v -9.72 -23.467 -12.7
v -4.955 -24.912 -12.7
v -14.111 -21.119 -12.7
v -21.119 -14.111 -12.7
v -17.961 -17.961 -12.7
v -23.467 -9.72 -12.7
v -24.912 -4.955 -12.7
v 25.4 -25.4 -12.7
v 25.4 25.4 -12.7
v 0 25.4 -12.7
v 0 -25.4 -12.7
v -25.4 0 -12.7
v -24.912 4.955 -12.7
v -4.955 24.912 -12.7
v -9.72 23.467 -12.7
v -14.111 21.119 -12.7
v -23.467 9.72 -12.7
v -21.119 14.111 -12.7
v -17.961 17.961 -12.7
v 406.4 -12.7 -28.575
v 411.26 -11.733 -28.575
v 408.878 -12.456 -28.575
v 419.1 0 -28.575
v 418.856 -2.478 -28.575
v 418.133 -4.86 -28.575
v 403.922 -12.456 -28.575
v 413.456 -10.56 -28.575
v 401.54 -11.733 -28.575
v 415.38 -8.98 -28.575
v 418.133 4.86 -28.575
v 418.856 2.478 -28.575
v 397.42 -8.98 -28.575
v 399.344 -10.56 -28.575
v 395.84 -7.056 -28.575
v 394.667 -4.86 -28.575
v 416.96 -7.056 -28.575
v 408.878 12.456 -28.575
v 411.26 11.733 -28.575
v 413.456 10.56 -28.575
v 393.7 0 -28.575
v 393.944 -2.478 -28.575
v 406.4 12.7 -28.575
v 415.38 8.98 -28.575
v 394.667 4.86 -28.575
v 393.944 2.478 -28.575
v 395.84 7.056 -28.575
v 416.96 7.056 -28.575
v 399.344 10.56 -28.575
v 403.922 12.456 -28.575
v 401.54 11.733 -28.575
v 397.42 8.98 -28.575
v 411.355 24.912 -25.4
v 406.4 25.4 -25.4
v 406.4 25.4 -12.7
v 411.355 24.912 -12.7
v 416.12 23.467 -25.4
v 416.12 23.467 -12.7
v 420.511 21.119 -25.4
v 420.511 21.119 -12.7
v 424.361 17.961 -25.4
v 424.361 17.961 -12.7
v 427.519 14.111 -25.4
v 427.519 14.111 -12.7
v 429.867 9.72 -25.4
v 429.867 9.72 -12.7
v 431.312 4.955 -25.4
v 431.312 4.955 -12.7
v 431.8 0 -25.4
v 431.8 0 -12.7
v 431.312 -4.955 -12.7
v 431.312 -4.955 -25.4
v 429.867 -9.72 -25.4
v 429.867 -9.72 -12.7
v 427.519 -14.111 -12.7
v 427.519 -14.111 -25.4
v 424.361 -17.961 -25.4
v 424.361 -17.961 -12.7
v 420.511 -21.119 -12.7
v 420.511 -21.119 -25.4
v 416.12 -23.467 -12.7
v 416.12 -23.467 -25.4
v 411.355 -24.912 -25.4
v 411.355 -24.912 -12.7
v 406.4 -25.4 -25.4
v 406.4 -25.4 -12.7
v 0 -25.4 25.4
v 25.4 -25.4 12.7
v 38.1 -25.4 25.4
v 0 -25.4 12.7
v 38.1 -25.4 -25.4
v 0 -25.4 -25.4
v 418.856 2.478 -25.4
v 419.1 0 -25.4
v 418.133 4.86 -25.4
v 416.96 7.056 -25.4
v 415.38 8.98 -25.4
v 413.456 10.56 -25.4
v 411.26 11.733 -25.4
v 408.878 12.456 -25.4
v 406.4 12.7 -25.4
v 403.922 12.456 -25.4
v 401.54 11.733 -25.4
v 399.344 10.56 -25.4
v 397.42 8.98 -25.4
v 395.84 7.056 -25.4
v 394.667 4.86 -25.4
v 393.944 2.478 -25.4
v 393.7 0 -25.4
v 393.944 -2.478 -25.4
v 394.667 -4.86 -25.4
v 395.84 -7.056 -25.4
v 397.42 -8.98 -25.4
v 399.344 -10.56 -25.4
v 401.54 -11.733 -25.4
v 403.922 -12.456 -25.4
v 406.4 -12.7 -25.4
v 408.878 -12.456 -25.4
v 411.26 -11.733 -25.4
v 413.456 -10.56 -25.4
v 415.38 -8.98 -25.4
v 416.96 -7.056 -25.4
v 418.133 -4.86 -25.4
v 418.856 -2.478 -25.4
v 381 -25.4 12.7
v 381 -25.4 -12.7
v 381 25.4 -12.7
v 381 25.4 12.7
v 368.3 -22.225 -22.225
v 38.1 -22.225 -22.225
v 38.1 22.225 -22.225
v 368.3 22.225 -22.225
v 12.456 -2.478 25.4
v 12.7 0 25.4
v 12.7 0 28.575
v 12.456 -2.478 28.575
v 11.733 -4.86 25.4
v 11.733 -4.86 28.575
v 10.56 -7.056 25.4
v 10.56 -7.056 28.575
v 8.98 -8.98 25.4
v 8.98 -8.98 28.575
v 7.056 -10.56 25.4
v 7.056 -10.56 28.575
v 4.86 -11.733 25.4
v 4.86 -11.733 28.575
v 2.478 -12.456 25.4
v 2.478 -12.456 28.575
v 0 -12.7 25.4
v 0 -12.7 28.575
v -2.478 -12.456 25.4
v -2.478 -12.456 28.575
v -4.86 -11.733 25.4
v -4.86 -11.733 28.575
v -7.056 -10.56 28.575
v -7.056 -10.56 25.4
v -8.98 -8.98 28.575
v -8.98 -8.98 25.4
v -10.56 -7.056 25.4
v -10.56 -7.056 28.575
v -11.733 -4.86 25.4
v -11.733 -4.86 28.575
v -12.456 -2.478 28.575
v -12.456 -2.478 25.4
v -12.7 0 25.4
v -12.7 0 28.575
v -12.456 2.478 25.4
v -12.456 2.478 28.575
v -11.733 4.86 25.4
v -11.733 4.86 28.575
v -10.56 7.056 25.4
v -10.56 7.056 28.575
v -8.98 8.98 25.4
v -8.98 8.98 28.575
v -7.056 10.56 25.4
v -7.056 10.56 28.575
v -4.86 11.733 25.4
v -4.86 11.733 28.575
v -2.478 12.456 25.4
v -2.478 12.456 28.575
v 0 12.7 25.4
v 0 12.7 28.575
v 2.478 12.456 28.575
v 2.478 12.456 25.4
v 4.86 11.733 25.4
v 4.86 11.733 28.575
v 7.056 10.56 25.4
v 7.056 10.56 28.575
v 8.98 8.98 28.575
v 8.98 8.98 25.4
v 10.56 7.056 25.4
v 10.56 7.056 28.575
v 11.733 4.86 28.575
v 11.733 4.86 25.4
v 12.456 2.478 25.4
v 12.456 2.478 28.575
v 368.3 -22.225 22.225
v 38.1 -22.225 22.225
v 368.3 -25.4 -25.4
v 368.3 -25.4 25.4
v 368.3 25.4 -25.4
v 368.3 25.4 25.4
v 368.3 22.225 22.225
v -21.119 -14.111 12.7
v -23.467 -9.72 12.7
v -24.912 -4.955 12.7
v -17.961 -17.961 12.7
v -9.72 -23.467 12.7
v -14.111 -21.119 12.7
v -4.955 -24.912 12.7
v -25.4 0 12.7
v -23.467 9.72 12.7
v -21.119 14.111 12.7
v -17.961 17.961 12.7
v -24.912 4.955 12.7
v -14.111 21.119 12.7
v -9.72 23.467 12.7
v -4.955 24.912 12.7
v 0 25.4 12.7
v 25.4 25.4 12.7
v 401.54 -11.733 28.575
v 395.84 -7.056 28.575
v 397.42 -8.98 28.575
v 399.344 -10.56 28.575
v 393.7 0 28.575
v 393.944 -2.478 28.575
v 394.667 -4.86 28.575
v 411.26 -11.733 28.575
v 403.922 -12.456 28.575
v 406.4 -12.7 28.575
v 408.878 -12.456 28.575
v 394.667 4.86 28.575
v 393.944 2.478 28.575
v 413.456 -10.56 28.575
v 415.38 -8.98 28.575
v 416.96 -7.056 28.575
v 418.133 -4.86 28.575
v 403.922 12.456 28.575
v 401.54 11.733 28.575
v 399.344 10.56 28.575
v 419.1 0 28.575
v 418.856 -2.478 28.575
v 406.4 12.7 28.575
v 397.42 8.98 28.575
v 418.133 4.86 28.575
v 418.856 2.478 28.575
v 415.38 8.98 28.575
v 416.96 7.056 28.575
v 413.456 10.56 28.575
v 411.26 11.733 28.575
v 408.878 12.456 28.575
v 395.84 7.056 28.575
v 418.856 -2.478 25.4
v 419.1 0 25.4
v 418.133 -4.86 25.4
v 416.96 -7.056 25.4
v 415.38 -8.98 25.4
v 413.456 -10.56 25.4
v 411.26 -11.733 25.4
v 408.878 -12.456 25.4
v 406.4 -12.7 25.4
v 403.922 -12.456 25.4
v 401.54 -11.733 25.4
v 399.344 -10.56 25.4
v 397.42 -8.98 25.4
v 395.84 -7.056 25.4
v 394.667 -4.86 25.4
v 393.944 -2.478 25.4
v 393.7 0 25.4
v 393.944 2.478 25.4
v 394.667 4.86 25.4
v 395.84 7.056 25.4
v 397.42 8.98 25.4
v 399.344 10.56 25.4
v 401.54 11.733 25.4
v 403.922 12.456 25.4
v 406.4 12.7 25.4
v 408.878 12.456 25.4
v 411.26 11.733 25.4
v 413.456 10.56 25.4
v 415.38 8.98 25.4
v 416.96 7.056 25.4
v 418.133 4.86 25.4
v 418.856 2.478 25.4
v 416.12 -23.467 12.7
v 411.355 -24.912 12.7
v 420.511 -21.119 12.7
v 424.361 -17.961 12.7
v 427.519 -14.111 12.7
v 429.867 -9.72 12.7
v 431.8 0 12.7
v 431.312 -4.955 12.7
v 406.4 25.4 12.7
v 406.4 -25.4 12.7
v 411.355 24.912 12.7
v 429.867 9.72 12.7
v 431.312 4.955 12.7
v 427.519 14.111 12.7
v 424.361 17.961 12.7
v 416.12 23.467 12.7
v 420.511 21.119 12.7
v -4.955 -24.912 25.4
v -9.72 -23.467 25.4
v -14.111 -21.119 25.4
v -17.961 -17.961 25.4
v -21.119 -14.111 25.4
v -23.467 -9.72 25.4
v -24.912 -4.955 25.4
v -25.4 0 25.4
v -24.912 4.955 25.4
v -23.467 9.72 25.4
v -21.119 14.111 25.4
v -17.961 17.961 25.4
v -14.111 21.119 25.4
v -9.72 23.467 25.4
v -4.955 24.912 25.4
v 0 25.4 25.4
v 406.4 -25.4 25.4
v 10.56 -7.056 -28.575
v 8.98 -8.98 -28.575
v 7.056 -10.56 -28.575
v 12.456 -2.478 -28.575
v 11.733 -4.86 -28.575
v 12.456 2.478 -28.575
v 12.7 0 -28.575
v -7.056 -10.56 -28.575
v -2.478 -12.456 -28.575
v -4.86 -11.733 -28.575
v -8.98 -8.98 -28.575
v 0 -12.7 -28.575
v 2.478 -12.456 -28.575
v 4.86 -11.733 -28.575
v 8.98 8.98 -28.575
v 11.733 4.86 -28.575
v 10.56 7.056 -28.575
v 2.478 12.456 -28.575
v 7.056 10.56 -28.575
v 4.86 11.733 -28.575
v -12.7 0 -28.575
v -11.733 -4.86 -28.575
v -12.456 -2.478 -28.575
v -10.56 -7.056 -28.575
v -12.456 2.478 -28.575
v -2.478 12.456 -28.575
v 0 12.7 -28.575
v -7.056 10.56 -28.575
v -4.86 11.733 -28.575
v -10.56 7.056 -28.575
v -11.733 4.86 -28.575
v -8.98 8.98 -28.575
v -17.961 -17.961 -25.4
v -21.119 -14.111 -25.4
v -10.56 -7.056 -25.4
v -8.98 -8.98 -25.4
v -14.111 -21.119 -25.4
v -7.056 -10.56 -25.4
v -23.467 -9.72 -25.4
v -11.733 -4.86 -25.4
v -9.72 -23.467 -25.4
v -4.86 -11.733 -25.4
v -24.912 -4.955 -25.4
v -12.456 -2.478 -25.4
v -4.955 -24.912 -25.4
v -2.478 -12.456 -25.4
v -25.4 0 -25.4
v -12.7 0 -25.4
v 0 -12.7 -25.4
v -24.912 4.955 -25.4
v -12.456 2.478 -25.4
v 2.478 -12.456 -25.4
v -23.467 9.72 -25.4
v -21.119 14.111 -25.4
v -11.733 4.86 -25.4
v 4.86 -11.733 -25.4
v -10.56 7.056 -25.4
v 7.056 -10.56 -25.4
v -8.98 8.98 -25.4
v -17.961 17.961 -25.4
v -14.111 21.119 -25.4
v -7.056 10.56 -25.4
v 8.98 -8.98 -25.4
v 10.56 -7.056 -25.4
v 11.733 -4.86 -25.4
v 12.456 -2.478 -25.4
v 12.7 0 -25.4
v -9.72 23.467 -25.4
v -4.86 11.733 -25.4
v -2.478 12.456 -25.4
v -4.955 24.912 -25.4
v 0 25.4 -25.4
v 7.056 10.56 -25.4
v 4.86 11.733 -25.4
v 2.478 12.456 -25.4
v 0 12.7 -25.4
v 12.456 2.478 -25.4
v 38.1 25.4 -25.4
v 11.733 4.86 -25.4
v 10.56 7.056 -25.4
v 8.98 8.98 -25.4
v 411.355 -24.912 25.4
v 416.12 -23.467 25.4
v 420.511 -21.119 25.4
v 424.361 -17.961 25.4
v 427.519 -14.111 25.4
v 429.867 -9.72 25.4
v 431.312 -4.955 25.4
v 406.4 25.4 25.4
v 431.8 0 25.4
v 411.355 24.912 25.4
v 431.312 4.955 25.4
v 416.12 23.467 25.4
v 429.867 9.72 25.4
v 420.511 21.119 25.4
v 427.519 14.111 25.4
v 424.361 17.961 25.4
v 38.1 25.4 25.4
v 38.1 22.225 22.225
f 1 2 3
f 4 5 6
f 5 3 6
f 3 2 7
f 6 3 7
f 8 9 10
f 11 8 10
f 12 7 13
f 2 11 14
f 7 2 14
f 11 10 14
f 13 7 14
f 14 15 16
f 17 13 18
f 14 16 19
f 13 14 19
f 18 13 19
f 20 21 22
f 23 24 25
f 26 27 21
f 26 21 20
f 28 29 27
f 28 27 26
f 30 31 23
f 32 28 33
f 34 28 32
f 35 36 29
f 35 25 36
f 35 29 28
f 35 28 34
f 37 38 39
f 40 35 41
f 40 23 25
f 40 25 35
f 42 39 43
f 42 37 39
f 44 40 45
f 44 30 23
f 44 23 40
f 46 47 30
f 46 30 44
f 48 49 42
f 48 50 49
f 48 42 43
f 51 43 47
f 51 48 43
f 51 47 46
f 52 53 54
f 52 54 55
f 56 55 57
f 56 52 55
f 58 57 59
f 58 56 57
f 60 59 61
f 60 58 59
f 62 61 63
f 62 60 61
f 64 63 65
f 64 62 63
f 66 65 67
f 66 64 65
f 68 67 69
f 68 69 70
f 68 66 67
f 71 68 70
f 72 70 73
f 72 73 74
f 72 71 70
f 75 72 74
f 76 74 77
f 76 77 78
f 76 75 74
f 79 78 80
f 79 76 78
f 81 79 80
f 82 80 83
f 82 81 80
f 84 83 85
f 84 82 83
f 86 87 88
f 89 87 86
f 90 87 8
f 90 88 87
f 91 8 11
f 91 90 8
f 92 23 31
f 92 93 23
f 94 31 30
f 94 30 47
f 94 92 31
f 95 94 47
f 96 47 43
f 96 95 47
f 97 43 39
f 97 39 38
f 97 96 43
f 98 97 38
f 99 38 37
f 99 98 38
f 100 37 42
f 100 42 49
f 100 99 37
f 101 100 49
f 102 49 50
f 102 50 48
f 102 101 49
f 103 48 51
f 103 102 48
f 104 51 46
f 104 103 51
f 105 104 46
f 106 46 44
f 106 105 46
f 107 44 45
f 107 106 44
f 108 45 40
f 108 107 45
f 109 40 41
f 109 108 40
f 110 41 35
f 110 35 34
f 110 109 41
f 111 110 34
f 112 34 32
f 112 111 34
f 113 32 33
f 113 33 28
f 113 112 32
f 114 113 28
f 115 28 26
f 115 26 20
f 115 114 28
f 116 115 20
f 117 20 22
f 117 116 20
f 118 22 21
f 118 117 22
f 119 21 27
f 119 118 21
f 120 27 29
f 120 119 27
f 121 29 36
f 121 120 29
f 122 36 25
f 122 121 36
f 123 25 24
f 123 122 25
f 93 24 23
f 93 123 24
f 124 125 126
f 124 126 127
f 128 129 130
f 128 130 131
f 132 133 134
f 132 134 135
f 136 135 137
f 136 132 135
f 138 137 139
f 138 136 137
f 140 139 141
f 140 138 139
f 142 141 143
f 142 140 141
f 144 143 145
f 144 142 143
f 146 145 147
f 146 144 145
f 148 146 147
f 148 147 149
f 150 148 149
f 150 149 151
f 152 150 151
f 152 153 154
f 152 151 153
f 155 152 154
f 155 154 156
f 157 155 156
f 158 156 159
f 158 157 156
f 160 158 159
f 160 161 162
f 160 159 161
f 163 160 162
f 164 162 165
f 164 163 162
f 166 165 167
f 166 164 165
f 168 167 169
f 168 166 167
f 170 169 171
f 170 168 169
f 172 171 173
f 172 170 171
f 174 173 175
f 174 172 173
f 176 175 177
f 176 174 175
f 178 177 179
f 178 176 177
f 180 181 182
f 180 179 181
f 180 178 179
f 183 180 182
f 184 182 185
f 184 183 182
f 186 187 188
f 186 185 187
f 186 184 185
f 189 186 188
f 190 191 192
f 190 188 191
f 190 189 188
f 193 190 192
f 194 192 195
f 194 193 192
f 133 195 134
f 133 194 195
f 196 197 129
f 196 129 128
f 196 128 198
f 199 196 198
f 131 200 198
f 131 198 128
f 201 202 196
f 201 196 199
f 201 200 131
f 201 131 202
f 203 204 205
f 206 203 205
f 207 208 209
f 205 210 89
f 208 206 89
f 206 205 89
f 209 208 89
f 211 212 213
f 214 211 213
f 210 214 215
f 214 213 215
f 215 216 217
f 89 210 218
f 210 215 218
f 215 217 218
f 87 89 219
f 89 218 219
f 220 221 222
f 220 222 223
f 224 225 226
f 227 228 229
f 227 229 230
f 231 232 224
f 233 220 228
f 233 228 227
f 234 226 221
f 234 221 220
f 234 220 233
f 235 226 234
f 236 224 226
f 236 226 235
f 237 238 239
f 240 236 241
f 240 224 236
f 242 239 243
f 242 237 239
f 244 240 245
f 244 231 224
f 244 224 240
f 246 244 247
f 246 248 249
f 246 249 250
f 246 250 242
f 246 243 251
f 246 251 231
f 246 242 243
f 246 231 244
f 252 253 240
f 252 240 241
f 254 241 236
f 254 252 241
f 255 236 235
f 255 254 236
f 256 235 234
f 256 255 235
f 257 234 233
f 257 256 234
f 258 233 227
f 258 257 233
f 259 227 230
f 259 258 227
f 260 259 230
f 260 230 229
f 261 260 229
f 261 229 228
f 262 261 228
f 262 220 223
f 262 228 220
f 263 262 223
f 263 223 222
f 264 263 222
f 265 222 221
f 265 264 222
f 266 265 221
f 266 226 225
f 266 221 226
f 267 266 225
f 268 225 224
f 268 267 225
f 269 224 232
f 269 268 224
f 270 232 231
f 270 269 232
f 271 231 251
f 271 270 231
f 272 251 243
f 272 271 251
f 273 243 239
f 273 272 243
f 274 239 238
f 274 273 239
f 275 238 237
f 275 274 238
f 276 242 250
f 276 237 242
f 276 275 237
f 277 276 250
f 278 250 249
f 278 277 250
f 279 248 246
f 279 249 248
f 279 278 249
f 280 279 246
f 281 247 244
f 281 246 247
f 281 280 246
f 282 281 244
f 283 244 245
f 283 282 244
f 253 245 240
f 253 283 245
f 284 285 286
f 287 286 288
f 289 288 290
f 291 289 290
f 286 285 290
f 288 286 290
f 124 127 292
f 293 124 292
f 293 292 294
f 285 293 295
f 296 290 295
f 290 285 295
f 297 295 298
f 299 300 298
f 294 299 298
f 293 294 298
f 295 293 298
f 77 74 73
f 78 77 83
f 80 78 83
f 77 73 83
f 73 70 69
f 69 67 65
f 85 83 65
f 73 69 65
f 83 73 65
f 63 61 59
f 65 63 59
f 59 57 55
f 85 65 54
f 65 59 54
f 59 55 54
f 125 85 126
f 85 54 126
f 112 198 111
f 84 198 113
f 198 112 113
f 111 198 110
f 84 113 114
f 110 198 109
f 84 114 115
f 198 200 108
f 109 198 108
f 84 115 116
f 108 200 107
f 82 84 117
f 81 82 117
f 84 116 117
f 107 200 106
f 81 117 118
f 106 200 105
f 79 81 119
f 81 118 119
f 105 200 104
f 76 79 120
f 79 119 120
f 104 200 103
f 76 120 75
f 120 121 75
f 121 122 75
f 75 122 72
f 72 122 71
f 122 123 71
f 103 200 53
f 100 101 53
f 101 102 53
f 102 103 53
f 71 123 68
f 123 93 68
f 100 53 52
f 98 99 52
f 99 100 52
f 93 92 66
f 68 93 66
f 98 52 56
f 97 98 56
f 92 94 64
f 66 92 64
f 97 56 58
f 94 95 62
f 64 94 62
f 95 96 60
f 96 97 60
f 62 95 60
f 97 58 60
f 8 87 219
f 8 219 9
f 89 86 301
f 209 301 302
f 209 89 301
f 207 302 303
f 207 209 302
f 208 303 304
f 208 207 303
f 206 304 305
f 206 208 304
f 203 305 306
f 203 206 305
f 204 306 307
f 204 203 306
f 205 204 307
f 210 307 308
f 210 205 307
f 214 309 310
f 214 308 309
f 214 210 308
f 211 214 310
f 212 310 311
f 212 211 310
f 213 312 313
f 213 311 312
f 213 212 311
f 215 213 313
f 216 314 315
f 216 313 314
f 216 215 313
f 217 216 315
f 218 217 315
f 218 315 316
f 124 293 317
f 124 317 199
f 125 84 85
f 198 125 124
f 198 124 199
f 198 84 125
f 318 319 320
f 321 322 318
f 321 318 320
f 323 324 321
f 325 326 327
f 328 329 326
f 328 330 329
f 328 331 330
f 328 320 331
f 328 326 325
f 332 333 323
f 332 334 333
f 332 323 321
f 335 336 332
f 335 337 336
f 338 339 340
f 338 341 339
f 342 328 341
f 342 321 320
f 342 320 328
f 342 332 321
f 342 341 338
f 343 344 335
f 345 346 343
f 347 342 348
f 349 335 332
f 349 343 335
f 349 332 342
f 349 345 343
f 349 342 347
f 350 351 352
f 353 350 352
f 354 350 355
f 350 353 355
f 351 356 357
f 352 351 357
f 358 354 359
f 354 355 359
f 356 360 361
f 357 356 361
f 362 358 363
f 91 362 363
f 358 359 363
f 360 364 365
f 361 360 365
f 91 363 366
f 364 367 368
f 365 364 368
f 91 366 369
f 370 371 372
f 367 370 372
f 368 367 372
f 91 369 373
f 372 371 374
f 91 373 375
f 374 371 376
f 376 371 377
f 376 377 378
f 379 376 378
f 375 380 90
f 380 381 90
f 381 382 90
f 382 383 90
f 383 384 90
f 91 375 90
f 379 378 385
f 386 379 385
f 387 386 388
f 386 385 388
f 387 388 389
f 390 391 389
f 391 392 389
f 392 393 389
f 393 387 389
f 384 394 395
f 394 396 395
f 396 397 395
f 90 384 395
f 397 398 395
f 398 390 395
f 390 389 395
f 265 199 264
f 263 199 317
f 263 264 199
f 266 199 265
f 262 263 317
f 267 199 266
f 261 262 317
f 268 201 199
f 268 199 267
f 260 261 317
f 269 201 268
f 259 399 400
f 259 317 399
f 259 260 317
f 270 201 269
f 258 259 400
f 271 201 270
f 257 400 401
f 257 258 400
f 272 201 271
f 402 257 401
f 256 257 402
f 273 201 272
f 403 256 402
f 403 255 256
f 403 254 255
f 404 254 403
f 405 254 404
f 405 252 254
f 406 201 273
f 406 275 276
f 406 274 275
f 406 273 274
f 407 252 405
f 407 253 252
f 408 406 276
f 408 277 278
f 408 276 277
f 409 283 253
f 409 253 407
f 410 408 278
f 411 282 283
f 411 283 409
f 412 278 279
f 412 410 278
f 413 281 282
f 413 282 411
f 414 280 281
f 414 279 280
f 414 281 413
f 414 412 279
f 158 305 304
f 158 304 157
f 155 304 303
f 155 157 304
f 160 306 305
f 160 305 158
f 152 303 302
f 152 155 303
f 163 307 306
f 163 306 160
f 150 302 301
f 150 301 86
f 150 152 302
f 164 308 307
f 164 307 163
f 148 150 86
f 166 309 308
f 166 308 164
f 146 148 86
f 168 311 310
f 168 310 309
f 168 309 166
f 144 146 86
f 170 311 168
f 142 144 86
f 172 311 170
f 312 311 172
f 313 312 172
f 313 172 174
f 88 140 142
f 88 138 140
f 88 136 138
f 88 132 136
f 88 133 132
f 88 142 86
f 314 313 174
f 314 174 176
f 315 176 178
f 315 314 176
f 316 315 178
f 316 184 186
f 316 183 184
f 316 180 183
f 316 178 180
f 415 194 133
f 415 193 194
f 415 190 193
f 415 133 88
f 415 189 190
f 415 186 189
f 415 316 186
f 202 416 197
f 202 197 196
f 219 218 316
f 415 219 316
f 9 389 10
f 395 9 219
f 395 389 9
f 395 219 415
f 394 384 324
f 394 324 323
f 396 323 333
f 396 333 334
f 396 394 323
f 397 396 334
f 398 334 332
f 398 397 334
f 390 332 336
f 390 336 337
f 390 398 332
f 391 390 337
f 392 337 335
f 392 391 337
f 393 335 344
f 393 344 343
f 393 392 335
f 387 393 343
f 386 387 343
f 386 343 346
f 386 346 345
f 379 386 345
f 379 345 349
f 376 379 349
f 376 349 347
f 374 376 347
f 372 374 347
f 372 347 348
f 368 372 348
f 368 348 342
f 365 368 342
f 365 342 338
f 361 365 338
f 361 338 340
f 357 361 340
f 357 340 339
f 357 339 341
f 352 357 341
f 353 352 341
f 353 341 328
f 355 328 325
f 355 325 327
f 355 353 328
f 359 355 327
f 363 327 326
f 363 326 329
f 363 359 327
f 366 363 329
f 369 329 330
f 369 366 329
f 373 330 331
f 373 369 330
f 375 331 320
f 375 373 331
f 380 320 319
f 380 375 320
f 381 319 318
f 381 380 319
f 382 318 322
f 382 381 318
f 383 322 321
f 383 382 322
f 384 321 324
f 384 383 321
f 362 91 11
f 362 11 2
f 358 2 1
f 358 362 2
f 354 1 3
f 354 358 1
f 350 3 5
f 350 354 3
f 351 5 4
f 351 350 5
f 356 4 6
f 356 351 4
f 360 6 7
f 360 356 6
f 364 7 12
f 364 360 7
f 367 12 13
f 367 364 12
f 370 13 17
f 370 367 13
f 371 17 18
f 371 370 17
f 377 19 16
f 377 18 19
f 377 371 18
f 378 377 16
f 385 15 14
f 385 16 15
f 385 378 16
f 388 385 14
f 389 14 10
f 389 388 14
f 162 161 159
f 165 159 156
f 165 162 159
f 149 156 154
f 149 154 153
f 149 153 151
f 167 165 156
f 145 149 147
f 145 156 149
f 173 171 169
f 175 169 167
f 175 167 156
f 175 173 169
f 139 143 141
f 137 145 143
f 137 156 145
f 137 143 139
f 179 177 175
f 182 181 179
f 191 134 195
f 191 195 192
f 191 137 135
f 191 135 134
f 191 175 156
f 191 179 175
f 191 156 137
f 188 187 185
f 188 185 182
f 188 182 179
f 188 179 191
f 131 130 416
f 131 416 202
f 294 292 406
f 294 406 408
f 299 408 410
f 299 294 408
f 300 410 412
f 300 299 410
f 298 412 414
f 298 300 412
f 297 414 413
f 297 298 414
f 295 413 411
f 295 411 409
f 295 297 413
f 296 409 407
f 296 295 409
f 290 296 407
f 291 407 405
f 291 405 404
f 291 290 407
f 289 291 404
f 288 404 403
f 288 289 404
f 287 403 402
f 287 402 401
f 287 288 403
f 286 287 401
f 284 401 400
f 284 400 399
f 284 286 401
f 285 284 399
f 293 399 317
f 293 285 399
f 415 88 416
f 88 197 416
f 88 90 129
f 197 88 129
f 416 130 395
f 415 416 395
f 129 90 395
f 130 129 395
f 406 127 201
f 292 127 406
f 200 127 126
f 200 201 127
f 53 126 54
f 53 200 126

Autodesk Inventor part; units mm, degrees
sketch "Sketch1" plane through (0, 0, 0) normal (0, 0, 1) x (1, 0, 0)
  line L0 (0, 25.4) -> (406.4, 25.4)
  line L1 (406.4, 25.4) -> (406.4, -25.4)
  line L2 (406.4, -25.4) -> (0, -25.4)
  line L3 (0, -25.4) -> (0, 25.4)
  circle A0 centre (0, 0) radius 25.4
  circle A1 centre (406.4, 0) radius 25.4
  dimension "d0" = 406.4
  dimension "d1" = 50.8
extrude "Extrusion1" add sketch "Sketch1" along normal mid plane 50.8
sketch "Sketch2" plane through (0, 25.4, 25.4) normal (0, 1, 0) x (1, 0, 0)
  line L0 (-25.4, 50.8) -> (-25.4, 0) projected
  line L1 (-25.4, 50.8) -> (0, 50.8) projected
  line L2 (0, 0) -> (-25.4, 0) projected
  line L3 (0, 0) -> (406.4, 0) projected
  line L4 (406.4, 50.8) -> (0, 50.8) projected
  line L5 (-25.4, 12.7) -> (25.4, 12.7)
  line L6 (25.4, 12.7) -> (25.4, 38.1)
  line L7 (25.4, 38.1) -> (-25.4, 38.1)
  line L8 (-25.4, 38.1) -> (-25.4, 12.7)
  point P0 (-25.4, 25.4)
  point P1 (-25.4, 25.4)
  dimension "d4" = 25.4
  dimension "d10" = 50.8
extrude "Extrusion2" cut sketch "Sketch2" against normal through all
ref_plane "Work Plane1" through (431.8, 0, 0) normal (1, 0, 0) x (0, 1, 0)
ref_plane "Work Plane2" through (-25.4, 0, 0) normal (1, 0, 0) x (0, 1, 0)
ref_plane "Work Plane3" through (203.2, 0, 0) normal (1, 0, 0) x (0, 1, 0)
sketch "Sketch5" plane through (0, 0, 25.4) normal (0, 0, 1) x (1, 0, 0)
  arc A0 (406.4, -25.4) -> (406.4, 25.4) centre (406.4, 0) ccw projected
  line L0 (0, 25.4) -> (406.4, 25.4) projected
  arc A1 (0, 25.4) -> (0, -25.4) centre (0, 0) ccw projected
  line L1 (406.4, -25.4) -> (0, -25.4) projected
  circle A2 centre (0, 0) radius 25.4 construction
  circle A3 centre (406.4, 0) radius 25.4 construction
  line L2 (38.1, 25.4) -> (38.1, -25.4)
  line L3 (368.3, 25.4) -> (368.3, -25.4)
  dimension "d11" = 12.7
  dimension "d13" = 12.7
extrude "Extrusion4" cut sketch "Sketch5" against normal blind 3.175 contours L1 L2 L0 L3
pattern_circular "Circular Pattern1" count 4 over 360 about axis through (-10, 0, 0) along (1, 0, 0) of "Extrusion4"
mirror "Mirror1" about plane through (203.2, 0, 0) normal (1, 0, 0) of "Extrusion2"
sketch "Sketch3" plane through (0, 0, 25.4) normal (0, 0, 1) x (1, 0, 0)
  arc A0 (0, 25.4) -> (0, -25.4) centre (0, 0) ccw projected
  arc A1 (406.4, -25.4) -> (406.4, 25.4) centre (406.4, 0) ccw projected
  circle A2 centre (0, 0) radius 12.7
  circle A3 centre (406.4, 0) radius 12.7
  dimension "d7" = 25.4
extrude "Extrusion3" add sketch "Sketch3" along normal blind 3.175
mirror "Mirror2" about plane through (0, 0, 0) normal (0, 0, 1) of "Extrusion3"
equation "\"d13\" = d11"
